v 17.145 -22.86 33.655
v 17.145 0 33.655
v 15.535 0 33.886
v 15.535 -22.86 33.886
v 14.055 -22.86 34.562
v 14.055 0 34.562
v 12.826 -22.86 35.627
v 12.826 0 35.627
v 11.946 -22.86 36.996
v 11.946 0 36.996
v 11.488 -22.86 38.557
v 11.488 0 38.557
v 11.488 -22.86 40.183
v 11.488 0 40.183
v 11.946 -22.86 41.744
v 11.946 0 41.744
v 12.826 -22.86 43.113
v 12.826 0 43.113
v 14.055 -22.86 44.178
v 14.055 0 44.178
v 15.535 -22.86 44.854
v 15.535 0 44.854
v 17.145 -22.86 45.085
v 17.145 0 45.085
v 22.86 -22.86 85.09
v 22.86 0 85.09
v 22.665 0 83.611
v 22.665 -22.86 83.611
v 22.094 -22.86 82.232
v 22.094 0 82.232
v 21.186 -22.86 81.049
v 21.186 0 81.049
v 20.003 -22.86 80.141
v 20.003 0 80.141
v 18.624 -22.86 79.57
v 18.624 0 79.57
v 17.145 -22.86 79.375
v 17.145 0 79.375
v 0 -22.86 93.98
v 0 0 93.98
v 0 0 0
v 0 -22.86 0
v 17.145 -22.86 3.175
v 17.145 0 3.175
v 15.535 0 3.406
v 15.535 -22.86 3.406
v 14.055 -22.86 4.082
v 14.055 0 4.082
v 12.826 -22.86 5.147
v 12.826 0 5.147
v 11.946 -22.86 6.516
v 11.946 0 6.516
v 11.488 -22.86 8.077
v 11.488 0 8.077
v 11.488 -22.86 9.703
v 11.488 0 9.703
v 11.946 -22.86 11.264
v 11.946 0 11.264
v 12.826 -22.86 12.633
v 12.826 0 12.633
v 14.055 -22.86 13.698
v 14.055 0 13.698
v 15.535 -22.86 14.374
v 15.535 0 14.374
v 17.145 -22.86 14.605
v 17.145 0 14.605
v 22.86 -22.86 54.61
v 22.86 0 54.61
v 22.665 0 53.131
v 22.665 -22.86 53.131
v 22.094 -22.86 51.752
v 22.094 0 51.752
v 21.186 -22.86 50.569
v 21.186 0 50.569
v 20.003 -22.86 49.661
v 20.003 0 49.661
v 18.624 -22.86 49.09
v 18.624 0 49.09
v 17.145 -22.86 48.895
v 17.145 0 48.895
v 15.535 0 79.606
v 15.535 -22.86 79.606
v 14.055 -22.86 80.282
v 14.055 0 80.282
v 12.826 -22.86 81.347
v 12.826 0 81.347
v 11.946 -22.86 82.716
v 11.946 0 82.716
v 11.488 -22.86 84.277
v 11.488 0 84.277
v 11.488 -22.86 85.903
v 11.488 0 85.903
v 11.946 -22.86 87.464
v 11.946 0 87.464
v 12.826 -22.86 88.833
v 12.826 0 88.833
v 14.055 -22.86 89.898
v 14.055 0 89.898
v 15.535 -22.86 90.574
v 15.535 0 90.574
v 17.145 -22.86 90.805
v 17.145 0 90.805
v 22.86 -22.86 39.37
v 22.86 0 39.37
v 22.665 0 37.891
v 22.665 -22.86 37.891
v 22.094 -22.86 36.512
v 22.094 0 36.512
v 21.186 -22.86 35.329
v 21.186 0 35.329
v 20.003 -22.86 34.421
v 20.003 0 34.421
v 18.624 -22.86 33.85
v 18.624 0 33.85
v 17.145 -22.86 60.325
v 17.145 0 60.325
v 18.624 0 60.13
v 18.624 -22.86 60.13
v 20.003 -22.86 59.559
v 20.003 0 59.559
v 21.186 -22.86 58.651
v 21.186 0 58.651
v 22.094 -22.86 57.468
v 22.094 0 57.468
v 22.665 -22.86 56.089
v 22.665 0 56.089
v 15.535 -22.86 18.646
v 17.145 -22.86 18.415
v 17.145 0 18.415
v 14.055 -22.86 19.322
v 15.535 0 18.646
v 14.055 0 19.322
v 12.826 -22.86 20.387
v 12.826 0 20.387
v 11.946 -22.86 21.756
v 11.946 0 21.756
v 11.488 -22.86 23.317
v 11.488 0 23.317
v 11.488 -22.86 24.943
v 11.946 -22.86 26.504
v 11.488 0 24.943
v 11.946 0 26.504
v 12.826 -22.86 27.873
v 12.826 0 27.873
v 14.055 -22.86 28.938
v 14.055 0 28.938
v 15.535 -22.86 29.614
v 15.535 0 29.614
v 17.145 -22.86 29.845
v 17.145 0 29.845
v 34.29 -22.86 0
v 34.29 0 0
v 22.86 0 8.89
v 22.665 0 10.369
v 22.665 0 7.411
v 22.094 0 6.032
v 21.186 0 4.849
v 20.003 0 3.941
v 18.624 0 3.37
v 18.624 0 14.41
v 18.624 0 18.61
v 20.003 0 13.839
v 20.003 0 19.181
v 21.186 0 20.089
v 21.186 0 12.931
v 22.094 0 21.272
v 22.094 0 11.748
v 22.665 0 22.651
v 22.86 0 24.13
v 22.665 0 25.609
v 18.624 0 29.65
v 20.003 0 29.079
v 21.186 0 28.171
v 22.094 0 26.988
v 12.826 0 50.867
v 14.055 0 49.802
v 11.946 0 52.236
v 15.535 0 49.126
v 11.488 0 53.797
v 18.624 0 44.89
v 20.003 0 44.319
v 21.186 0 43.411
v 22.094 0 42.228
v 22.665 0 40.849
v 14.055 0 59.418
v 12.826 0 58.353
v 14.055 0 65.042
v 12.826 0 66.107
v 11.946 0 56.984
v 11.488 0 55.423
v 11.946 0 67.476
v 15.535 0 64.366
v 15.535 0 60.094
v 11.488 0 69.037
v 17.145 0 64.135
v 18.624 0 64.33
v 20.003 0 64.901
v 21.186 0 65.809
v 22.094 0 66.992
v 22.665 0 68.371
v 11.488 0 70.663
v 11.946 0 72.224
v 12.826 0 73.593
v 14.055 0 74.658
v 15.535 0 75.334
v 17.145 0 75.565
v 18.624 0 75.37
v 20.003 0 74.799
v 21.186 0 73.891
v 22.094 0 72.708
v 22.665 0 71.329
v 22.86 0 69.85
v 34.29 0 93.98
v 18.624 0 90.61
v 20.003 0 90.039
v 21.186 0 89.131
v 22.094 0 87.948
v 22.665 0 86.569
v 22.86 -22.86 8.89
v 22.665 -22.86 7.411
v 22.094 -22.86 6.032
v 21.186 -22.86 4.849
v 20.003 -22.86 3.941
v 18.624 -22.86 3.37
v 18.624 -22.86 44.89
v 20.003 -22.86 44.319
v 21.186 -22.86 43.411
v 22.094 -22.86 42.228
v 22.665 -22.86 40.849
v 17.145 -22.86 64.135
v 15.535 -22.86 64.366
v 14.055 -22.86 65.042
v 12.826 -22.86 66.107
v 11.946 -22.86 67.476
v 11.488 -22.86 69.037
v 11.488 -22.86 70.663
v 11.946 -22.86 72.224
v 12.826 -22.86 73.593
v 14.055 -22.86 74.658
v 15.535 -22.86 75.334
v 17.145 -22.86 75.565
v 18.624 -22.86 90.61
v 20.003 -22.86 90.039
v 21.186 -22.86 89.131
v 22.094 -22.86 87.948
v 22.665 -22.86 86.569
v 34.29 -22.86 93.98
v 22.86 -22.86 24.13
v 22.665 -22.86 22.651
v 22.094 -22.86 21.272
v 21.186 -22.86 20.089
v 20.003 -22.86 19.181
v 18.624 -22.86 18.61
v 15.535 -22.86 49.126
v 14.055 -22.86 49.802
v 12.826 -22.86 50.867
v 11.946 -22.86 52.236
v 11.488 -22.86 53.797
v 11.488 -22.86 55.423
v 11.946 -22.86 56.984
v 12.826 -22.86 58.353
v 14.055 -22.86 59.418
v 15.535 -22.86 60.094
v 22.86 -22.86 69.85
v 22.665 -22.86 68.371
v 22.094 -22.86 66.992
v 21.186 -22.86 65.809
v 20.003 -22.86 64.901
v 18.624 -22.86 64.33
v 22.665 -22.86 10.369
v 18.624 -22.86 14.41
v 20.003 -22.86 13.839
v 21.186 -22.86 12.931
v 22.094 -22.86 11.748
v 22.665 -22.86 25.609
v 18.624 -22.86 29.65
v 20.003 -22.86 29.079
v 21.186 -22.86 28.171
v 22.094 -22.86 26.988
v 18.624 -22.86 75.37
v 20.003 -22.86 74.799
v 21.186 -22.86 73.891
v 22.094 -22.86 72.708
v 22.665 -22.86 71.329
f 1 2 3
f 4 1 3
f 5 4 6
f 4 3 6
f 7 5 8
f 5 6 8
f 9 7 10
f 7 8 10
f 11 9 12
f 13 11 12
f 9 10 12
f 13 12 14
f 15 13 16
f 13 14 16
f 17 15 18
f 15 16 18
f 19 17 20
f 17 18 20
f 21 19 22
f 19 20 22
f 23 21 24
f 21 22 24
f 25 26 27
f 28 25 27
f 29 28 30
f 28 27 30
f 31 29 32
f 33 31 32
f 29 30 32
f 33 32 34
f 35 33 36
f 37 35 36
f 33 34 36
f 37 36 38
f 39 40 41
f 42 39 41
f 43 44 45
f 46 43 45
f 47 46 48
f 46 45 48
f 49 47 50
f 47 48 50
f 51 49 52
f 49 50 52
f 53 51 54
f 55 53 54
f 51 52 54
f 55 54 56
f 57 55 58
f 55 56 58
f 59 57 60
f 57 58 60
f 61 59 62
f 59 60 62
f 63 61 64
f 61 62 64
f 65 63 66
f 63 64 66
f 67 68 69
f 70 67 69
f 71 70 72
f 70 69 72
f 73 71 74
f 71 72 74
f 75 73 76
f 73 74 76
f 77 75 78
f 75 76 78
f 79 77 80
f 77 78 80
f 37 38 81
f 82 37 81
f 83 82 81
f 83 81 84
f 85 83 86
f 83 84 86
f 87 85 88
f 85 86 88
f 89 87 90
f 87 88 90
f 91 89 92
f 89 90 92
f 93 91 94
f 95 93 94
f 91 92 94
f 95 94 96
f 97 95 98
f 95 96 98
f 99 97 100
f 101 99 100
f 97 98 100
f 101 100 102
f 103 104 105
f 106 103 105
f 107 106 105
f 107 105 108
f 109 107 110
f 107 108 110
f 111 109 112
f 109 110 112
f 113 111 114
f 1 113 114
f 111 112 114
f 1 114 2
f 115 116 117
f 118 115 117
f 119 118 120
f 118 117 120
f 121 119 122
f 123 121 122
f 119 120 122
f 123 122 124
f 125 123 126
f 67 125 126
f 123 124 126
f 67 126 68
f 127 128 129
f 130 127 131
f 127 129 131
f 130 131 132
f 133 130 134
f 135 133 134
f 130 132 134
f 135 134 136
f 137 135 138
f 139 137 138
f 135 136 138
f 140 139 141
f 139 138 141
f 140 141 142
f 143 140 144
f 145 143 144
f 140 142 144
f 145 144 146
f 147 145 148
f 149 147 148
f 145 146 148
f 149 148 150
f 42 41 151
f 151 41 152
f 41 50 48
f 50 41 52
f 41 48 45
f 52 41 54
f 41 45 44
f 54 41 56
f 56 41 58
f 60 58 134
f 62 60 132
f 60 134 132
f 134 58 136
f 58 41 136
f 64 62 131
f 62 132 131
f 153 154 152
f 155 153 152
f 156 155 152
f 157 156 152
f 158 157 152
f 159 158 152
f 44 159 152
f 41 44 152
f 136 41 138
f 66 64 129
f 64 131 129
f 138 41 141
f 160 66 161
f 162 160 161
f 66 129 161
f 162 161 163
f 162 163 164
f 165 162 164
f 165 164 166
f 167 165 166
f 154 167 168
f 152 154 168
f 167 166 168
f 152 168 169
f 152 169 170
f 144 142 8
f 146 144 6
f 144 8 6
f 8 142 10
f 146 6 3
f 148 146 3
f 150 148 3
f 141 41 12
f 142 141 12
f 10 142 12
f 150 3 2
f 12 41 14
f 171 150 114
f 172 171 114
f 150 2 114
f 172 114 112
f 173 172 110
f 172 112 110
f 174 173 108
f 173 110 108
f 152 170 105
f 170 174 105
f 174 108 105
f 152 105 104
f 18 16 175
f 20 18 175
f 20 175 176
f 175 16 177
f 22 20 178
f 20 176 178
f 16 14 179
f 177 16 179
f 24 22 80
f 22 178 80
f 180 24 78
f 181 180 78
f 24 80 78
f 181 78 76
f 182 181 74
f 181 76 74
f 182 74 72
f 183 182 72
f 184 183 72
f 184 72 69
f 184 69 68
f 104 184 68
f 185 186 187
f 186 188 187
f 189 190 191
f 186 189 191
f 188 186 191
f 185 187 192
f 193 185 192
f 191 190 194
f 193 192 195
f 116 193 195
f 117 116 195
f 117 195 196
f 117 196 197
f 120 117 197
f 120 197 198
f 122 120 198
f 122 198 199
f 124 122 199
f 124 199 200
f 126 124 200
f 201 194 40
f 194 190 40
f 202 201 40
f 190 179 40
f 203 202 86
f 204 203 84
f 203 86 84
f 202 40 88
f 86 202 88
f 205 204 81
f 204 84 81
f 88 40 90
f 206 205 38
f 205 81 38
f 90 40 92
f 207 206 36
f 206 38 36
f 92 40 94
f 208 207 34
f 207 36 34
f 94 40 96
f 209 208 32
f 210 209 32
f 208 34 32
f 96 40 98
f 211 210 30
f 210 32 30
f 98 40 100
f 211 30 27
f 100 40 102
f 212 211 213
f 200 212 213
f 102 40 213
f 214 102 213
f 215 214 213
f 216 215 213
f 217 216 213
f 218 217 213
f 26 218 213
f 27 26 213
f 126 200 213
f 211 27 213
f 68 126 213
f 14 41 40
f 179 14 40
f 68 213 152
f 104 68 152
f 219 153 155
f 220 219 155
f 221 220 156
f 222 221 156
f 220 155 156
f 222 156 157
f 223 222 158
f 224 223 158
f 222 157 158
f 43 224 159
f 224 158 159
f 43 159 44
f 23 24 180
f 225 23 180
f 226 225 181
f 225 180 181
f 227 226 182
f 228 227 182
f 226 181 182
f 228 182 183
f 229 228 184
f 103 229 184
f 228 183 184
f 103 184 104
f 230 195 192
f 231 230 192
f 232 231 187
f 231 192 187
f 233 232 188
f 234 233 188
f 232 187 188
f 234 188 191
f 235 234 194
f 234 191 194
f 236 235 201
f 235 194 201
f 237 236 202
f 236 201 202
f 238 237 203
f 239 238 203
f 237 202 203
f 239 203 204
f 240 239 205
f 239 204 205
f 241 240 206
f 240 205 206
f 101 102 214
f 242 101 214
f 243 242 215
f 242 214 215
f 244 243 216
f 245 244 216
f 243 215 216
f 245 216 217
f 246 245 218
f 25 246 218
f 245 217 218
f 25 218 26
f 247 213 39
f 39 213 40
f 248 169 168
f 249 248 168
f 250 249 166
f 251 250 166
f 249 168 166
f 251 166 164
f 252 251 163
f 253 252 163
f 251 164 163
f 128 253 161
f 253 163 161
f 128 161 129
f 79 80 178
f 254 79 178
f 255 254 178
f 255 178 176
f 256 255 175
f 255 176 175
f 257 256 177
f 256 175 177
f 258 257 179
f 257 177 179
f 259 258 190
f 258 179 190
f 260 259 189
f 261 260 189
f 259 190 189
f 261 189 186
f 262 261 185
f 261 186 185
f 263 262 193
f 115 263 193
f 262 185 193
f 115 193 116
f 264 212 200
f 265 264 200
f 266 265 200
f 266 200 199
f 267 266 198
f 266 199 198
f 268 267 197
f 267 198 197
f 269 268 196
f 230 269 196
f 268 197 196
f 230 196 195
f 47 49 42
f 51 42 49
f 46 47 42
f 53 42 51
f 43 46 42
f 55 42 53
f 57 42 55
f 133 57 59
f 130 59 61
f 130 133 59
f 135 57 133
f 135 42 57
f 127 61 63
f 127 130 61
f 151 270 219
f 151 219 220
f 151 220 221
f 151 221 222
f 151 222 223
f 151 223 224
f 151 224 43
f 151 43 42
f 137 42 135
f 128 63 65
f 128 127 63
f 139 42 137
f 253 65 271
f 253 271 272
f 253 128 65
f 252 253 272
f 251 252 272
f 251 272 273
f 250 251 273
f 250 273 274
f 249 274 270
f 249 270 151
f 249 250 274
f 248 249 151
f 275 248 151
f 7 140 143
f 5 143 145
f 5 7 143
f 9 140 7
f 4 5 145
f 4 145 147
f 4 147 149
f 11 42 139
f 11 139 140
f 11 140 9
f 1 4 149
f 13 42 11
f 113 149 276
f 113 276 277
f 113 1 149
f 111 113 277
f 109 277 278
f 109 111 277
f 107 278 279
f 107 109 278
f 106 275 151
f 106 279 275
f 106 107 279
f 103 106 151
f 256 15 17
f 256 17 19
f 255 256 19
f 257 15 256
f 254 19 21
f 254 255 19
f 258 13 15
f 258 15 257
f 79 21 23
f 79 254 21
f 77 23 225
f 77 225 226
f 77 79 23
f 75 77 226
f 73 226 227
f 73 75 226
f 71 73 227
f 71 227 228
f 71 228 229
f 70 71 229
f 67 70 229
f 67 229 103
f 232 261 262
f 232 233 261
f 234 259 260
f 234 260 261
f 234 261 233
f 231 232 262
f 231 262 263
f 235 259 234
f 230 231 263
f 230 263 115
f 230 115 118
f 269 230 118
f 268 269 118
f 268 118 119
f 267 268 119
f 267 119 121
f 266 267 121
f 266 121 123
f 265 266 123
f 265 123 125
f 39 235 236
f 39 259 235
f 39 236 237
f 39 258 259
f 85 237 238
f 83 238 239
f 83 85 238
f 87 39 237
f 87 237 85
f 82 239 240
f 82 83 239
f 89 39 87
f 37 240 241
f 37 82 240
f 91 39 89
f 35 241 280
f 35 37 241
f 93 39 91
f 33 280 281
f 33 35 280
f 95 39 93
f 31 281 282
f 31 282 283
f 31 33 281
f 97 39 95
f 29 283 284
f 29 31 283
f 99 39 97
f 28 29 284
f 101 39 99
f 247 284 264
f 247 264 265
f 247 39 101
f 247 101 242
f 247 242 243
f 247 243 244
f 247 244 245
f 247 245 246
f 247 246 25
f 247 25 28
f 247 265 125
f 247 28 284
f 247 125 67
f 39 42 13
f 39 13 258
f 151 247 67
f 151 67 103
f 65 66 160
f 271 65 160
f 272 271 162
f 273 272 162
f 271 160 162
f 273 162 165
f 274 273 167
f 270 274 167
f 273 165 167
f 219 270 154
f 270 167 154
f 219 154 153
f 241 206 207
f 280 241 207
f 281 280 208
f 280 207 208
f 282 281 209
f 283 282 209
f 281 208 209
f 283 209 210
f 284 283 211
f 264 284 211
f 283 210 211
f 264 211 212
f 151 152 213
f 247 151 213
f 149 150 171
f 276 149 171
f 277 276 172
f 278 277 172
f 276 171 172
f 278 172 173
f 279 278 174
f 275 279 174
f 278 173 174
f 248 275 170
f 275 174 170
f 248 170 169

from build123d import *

# Parameters (mm, degrees)
F1_DEPTH = 22.86


with BuildPart() as f1:
    # F0 (on Front) → F1 (new body)
    with BuildSketch(Plane.XZ):
        with BuildLine():
            Line((0, 93.98), (0, 0))
            Line((0, 0), (17.145, 0))
            Line((17.145, 0), (17.145, 3.175))
            ThreePointArc((17.145, 3.175), (11.43, 8.89), (17.145, 14.605))
            Line((17.145, 14.605), (17.145, 18.415))
            ThreePointArc((17.145, 18.415), (11.43, 24.13), (17.145, 29.845))
            Line((17.145, 29.845), (17.145, 33.655))
            ThreePointArc((17.145, 33.655), (11.43, 39.37), (17.145, 45.085))
            Line((17.145, 45.085), (17.145, 48.895))
            ThreePointArc((17.145, 48.895), (11.43, 54.61), (17.145, 60.325))
            Line((17.145, 60.325), (17.145, 64.135))
            ThreePointArc((17.145, 64.135), (11.43, 69.85), (17.145, 75.565))
            Line((17.145, 75.565), (17.145, 79.375))
            ThreePointArc((17.145, 79.375), (11.43, 85.09), (17.145, 90.805))
            Line((17.145, 90.805), (17.145, 93.98))
            Line((17.145, 93.98), (0, 93.98))
        make_face()
        with BuildLine():
            Line((17.145, 3.175), (17.145, 0))
            Line((17.145, 0), (34.29, 0))
            Line((34.29, 0), (34.29, 93.98))
            Line((34.29, 93.98), (17.145, 93.98))
            Line((17.145, 93.98), (17.145, 90.805))
            ThreePointArc((17.145, 90.805), (21.1861152545, 89.1311152545), (22.86, 85.09))
            ThreePointArc((22.86, 85.09), (21.1861152545, 81.0488847455), (17.145, 79.375))
            Line((17.145, 79.375), (17.145, 75.565))
            ThreePointArc((17.145, 75.565), (21.1861152545, 73.8911152545), (22.86, 69.85))
            ThreePointArc((22.86, 69.85), (21.1861152545, 65.8088847455), (17.145, 64.135))
            Line((17.145, 64.135), (17.145, 60.325))
            ThreePointArc((17.145, 60.325), (21.1861152545, 58.6511152545), (22.86, 54.61))
            ThreePointArc((22.86, 54.61), (21.1861152545, 50.5688847455), (17.145, 48.895))
            Line((17.145, 48.895), (17.145, 45.085))
            ThreePointArc((17.145, 45.085), (21.1861152545, 43.4111152545), (22.86, 39.37))
            ThreePointArc((22.86, 39.37), (21.1861152545, 35.3288847455), (17.145, 33.655))
            Line((17.145, 33.655), (17.145, 29.845))
            ThreePointArc((17.145, 29.845), (21.1861152545, 28.1711152545), (22.86, 24.13))
            ThreePointArc((22.86, 24.13), (21.1861152545, 20.0888847455), (17.145, 18.415))
            Line((17.145, 18.415), (17.145, 14.605))
            ThreePointArc((17.145, 14.605), (21.1861152545, 12.9311152545), (22.86, 8.89))
            ThreePointArc((22.86, 8.89), (21.1861152545, 4.8488847455), (17.145, 3.175))
        make_face()
    extrude(amount=F1_DEPTH)


solid = f1.part
